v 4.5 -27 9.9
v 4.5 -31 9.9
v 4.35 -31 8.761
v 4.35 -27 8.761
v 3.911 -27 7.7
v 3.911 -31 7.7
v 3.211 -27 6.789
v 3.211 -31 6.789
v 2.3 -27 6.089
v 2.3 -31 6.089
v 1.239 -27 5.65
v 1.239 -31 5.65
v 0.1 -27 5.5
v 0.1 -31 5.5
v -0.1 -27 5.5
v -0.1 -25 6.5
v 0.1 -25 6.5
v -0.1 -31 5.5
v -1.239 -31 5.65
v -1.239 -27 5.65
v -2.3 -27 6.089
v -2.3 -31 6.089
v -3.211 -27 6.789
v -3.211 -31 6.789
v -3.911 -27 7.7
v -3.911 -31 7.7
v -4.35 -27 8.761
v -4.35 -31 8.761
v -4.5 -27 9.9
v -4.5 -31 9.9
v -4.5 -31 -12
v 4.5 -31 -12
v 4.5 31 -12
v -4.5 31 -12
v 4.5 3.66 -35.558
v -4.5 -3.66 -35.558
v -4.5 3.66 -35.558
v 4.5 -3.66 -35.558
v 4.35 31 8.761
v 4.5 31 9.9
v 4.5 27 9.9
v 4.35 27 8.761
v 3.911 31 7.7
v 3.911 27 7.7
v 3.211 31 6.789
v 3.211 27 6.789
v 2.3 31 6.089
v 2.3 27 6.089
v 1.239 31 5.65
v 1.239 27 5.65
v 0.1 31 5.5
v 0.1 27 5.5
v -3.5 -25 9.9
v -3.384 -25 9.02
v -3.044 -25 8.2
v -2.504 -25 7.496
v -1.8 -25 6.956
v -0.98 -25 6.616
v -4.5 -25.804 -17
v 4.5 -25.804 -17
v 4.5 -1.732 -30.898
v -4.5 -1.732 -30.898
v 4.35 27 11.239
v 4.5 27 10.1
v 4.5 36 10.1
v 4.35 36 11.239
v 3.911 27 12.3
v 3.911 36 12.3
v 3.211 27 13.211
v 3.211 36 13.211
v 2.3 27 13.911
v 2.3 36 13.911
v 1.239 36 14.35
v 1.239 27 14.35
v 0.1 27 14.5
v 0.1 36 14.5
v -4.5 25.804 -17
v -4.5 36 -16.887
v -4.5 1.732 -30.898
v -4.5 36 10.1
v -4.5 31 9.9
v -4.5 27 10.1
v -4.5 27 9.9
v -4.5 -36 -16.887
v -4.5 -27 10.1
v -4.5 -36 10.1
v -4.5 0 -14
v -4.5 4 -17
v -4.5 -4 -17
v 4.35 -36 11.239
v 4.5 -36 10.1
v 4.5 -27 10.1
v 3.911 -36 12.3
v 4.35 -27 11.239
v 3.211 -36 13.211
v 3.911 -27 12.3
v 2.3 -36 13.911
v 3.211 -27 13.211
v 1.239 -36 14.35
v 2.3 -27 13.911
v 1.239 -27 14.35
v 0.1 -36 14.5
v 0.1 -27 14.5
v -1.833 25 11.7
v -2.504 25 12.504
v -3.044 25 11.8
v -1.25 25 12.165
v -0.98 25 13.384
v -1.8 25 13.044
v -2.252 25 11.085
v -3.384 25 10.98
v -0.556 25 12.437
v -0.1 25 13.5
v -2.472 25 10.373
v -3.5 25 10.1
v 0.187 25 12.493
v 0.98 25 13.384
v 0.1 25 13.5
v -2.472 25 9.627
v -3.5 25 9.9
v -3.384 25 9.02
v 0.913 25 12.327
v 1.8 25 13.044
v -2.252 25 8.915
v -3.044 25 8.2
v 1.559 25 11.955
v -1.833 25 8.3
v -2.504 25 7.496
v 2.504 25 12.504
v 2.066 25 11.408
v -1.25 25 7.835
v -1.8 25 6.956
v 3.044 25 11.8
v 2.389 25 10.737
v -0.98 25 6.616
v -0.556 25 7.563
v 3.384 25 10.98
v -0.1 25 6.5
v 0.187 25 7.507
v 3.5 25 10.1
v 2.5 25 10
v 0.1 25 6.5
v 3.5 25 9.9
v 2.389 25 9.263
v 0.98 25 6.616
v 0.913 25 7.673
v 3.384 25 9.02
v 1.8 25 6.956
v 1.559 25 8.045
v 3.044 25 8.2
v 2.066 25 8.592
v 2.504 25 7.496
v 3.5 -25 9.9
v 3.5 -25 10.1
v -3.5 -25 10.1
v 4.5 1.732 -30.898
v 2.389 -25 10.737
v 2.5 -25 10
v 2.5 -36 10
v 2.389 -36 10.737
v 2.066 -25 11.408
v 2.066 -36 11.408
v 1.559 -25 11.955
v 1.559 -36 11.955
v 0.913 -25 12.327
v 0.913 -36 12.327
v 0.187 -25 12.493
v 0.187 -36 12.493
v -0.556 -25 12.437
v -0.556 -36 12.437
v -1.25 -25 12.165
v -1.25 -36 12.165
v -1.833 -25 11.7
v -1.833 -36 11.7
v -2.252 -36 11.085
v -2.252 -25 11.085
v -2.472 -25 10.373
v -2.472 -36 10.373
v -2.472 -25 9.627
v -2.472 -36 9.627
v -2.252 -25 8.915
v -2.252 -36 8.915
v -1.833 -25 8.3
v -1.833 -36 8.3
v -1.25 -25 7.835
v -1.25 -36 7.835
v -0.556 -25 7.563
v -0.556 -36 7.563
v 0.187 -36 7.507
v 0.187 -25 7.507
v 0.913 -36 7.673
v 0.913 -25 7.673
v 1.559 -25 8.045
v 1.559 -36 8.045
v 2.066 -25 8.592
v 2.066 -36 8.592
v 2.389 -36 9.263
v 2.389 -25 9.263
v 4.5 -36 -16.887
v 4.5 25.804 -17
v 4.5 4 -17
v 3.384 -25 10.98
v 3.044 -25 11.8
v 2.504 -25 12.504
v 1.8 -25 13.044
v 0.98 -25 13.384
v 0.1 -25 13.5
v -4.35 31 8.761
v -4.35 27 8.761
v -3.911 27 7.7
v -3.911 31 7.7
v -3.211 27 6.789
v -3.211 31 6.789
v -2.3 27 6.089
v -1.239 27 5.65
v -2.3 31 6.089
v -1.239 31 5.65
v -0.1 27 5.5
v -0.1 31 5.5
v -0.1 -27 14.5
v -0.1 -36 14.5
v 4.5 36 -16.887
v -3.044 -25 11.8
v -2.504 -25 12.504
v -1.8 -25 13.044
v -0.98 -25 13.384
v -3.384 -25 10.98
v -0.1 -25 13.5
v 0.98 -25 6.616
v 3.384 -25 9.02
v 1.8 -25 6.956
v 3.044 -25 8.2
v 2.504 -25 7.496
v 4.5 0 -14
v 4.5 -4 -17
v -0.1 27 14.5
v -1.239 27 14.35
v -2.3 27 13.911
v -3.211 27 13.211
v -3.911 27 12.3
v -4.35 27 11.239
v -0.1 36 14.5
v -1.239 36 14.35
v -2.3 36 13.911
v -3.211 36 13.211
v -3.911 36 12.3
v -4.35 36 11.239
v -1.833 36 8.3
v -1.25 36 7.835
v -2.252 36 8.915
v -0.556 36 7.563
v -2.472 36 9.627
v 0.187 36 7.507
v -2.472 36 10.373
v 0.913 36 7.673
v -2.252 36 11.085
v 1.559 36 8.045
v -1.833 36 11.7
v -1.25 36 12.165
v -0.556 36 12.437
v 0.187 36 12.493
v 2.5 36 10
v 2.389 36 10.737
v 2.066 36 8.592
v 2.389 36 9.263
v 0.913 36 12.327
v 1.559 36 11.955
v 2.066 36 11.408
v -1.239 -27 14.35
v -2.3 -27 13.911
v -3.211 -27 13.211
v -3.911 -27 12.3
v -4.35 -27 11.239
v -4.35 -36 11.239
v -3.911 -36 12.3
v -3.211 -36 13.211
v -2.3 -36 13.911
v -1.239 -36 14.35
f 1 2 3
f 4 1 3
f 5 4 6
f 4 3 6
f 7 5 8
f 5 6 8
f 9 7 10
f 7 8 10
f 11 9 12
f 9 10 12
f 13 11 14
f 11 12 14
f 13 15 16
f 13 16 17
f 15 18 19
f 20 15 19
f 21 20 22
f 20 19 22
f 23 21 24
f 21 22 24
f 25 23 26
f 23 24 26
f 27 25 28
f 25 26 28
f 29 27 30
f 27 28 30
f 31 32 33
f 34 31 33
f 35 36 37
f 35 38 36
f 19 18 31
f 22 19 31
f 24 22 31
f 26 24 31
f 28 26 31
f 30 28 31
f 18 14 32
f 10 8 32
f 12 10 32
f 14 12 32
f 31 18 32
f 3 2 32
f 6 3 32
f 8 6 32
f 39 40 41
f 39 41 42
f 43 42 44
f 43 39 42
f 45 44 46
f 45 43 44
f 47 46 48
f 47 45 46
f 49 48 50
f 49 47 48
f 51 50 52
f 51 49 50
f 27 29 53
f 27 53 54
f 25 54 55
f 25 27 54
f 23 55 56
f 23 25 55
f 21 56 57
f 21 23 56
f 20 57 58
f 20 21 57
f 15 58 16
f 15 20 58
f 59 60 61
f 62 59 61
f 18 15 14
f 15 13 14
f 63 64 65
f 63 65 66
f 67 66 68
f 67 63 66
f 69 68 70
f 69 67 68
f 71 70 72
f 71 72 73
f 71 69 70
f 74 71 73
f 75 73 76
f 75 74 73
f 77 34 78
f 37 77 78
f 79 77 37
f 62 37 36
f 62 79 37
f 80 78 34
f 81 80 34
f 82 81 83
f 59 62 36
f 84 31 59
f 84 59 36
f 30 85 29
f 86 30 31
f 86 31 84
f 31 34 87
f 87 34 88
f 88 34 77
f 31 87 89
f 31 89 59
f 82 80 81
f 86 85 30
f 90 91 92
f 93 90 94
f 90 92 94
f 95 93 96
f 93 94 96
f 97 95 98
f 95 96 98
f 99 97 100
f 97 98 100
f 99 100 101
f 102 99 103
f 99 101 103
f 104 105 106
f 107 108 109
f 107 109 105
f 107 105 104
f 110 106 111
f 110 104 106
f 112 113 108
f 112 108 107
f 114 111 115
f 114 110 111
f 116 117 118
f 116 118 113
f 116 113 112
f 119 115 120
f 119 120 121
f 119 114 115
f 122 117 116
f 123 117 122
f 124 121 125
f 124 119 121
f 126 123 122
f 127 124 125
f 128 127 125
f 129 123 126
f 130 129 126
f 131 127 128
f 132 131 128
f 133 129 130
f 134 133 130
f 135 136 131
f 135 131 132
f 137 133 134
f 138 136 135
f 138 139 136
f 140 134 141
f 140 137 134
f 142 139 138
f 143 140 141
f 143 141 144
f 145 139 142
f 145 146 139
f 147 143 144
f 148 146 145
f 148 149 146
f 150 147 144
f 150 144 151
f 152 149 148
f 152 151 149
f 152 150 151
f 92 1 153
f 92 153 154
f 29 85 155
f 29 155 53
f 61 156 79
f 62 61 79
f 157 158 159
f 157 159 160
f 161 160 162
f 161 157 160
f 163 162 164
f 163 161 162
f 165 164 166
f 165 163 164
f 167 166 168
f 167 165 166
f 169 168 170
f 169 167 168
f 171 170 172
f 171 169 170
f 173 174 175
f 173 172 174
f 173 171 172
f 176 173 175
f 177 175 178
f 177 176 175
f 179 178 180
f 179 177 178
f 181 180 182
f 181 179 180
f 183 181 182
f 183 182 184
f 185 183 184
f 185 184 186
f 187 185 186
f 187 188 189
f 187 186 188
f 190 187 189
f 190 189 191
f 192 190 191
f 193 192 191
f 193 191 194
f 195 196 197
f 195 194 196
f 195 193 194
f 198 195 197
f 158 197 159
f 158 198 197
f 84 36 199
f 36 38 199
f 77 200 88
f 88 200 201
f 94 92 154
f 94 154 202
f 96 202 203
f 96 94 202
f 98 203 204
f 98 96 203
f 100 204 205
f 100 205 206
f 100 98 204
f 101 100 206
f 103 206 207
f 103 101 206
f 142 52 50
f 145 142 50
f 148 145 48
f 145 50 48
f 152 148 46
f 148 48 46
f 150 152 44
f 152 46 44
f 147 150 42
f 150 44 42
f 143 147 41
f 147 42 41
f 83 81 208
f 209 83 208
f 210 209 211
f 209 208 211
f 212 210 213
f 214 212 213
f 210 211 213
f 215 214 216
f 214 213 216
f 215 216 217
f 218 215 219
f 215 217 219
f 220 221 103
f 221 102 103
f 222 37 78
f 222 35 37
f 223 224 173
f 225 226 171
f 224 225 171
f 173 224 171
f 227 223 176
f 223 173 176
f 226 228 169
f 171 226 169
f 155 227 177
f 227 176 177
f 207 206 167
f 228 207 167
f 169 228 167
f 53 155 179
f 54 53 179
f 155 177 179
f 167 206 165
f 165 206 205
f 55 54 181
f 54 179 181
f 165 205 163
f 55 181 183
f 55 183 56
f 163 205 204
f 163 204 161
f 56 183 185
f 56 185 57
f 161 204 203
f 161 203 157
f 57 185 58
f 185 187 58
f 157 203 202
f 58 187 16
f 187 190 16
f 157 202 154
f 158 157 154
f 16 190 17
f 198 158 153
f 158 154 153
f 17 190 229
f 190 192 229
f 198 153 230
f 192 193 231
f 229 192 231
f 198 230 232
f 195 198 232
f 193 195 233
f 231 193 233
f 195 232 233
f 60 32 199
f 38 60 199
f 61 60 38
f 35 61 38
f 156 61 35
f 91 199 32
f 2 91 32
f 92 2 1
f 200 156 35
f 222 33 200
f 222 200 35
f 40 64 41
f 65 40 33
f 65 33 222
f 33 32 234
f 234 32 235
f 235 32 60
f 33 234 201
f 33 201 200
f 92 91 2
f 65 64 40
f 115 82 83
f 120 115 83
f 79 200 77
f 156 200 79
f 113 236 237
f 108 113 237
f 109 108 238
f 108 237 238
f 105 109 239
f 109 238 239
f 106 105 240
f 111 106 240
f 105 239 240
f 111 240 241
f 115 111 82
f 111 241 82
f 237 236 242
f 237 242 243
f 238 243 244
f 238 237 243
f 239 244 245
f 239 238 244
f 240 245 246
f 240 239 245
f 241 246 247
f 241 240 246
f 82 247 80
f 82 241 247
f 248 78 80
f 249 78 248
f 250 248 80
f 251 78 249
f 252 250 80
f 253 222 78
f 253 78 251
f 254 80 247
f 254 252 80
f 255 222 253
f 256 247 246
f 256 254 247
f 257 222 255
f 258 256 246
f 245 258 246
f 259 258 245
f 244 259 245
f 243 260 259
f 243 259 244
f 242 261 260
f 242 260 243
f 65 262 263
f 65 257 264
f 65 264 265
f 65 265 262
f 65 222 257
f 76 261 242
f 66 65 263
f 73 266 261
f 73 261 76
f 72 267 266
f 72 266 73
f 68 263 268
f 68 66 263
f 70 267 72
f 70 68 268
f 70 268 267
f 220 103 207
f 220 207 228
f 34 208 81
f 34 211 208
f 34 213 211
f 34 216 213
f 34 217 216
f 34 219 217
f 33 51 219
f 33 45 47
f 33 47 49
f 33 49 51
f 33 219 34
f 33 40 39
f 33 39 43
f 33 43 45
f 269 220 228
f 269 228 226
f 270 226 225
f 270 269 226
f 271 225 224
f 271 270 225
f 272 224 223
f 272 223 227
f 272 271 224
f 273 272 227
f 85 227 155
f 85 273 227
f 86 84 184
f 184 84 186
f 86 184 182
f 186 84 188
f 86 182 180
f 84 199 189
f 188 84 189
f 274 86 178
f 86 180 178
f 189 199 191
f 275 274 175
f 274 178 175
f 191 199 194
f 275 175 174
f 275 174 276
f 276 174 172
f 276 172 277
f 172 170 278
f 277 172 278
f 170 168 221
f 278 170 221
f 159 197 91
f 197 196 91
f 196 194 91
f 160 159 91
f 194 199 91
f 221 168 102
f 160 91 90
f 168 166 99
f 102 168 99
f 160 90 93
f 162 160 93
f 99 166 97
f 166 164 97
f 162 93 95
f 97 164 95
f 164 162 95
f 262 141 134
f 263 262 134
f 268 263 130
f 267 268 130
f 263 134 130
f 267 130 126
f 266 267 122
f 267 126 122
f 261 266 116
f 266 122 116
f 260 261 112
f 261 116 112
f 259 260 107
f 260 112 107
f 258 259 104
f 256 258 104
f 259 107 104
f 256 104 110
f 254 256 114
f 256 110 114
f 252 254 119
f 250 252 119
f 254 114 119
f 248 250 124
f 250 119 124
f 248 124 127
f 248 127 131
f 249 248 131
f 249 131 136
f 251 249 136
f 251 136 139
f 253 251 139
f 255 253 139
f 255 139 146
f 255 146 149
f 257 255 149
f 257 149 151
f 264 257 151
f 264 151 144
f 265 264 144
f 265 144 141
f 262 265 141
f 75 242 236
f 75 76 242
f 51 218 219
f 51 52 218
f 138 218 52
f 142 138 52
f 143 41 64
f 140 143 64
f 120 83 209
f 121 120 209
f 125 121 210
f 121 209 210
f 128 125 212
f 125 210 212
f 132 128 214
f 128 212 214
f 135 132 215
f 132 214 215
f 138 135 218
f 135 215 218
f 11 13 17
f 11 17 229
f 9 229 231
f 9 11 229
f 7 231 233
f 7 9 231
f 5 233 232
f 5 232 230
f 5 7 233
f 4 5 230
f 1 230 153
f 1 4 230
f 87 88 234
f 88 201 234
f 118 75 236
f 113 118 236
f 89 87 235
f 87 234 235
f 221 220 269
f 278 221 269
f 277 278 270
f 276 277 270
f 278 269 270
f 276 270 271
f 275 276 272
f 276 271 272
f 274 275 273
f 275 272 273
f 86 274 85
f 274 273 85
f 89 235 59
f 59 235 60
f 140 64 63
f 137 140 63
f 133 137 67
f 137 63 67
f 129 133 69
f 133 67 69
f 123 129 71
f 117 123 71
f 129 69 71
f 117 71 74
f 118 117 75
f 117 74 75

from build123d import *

# Parameters (mm, degrees)
PAD001_DEPTH         = 4.5
FILLET_R             = 4.4
CHAMFER_1_SIZE2      = 2
CHAMFER_1_SIZE       = 1
CHAMFER_2_SIZE2      = 2
CHAMFER_2_SIZE       = 1
CHAMFER001_SIZE      = 2
PAD002_DEPTH         = 4.5
SKETCH006_R          = 2.5
POCKET001_DEPTH      = 36.001
POCKET001_DEPTH_BACK = 36.001


with BuildPart() as part:
    # Sketch004 → Pad001 (new body, symmetric)
    with BuildSketch(Plane.YZ):
        Polygon((-31, 5.5), (-31, -14), (0, -31.897858), (0, -35.558112), (-3.660254, -35.558112), (-36, -16.886751), (-36, 14.5), (-25, 14.5), (-25, 5.5), align=None)
    pad001 = extrude(amount=PAD001_DEPTH, both=True)

    # Mirrored: Pad001 across Sketch004 V_Axis
    add(pad001.mirror(Plane(origin=(0, 0, 0), x_dir=(1, 0, 0), z_dir=(0, 1, 0))))

    # Fillet
    fillet_edges = [part.edges().sort_by_distance(p)[0] for p in [
        (-4.5, 28, 5.5),
        (-4.5, 30.5, 14.5),
        (4.5, 28, 5.5),
        (-4.5, -28, 5.5),
        (-4.5, -30.5, 14.5),
        (4.5, -30.5, 14.5),
        (4.5, 30.5, 14.5),
        (4.5, -28, 5.5),
    ]]
    fillet(fillet_edges, radius=FILLET_R)

    # Chamfer 1
    chamfer_1_edges = [part.edges().sort_by_distance(p)[0] for p in [
        (-3.21127, 25, 13.21127),
    ]]
    chamfer_1_side = part.faces().sort_by_distance((0, 25, 10))[0]
    chamfer(chamfer_1_edges, length=CHAMFER_1_SIZE, length2=CHAMFER_1_SIZE2, reference=chamfer_1_side)

    # Chamfer 2
    chamfer_2_edges = [part.edges().sort_by_distance(p)[0] for p in [
        (-3.21127, -25, 13.21127),
    ]]
    chamfer_2_side = part.faces().sort_by_distance((0, -25, 10))[0]
    chamfer(chamfer_2_edges, length=CHAMFER_2_SIZE, length2=CHAMFER_2_SIZE2, reference=chamfer_2_side)

    # Chamfer001
    chamfer001_edges = [part.edges().sort_by_distance(p)[0] for p in [
        (0, 0, -31.897858),
    ]]
    chamfer(chamfer001_edges, length=CHAMFER001_SIZE)

    # Sketch005 → Pad002 (join, symmetric)
    with BuildSketch(Plane.YZ):
        Polygon((-34, -12), (34, -12), (34, -17), (4, -17), (0, -14), (-4, -17), (-34, -17), align=None)
    extrude(amount=PAD002_DEPTH, both=True)

    # Sketch006 → Pocket001 (cut, two sides)
    with BuildSketch(Plane.XZ) as pocket001_sk:
        with Locations((0, 10)):
            Circle(SKETCH006_R)
    extrude(amount=-POCKET001_DEPTH, mode=Mode.SUBTRACT)
    extrude(pocket001_sk.sketch, amount=POCKET001_DEPTH_BACK, mode=Mode.SUBTRACT)


solid = part.part
